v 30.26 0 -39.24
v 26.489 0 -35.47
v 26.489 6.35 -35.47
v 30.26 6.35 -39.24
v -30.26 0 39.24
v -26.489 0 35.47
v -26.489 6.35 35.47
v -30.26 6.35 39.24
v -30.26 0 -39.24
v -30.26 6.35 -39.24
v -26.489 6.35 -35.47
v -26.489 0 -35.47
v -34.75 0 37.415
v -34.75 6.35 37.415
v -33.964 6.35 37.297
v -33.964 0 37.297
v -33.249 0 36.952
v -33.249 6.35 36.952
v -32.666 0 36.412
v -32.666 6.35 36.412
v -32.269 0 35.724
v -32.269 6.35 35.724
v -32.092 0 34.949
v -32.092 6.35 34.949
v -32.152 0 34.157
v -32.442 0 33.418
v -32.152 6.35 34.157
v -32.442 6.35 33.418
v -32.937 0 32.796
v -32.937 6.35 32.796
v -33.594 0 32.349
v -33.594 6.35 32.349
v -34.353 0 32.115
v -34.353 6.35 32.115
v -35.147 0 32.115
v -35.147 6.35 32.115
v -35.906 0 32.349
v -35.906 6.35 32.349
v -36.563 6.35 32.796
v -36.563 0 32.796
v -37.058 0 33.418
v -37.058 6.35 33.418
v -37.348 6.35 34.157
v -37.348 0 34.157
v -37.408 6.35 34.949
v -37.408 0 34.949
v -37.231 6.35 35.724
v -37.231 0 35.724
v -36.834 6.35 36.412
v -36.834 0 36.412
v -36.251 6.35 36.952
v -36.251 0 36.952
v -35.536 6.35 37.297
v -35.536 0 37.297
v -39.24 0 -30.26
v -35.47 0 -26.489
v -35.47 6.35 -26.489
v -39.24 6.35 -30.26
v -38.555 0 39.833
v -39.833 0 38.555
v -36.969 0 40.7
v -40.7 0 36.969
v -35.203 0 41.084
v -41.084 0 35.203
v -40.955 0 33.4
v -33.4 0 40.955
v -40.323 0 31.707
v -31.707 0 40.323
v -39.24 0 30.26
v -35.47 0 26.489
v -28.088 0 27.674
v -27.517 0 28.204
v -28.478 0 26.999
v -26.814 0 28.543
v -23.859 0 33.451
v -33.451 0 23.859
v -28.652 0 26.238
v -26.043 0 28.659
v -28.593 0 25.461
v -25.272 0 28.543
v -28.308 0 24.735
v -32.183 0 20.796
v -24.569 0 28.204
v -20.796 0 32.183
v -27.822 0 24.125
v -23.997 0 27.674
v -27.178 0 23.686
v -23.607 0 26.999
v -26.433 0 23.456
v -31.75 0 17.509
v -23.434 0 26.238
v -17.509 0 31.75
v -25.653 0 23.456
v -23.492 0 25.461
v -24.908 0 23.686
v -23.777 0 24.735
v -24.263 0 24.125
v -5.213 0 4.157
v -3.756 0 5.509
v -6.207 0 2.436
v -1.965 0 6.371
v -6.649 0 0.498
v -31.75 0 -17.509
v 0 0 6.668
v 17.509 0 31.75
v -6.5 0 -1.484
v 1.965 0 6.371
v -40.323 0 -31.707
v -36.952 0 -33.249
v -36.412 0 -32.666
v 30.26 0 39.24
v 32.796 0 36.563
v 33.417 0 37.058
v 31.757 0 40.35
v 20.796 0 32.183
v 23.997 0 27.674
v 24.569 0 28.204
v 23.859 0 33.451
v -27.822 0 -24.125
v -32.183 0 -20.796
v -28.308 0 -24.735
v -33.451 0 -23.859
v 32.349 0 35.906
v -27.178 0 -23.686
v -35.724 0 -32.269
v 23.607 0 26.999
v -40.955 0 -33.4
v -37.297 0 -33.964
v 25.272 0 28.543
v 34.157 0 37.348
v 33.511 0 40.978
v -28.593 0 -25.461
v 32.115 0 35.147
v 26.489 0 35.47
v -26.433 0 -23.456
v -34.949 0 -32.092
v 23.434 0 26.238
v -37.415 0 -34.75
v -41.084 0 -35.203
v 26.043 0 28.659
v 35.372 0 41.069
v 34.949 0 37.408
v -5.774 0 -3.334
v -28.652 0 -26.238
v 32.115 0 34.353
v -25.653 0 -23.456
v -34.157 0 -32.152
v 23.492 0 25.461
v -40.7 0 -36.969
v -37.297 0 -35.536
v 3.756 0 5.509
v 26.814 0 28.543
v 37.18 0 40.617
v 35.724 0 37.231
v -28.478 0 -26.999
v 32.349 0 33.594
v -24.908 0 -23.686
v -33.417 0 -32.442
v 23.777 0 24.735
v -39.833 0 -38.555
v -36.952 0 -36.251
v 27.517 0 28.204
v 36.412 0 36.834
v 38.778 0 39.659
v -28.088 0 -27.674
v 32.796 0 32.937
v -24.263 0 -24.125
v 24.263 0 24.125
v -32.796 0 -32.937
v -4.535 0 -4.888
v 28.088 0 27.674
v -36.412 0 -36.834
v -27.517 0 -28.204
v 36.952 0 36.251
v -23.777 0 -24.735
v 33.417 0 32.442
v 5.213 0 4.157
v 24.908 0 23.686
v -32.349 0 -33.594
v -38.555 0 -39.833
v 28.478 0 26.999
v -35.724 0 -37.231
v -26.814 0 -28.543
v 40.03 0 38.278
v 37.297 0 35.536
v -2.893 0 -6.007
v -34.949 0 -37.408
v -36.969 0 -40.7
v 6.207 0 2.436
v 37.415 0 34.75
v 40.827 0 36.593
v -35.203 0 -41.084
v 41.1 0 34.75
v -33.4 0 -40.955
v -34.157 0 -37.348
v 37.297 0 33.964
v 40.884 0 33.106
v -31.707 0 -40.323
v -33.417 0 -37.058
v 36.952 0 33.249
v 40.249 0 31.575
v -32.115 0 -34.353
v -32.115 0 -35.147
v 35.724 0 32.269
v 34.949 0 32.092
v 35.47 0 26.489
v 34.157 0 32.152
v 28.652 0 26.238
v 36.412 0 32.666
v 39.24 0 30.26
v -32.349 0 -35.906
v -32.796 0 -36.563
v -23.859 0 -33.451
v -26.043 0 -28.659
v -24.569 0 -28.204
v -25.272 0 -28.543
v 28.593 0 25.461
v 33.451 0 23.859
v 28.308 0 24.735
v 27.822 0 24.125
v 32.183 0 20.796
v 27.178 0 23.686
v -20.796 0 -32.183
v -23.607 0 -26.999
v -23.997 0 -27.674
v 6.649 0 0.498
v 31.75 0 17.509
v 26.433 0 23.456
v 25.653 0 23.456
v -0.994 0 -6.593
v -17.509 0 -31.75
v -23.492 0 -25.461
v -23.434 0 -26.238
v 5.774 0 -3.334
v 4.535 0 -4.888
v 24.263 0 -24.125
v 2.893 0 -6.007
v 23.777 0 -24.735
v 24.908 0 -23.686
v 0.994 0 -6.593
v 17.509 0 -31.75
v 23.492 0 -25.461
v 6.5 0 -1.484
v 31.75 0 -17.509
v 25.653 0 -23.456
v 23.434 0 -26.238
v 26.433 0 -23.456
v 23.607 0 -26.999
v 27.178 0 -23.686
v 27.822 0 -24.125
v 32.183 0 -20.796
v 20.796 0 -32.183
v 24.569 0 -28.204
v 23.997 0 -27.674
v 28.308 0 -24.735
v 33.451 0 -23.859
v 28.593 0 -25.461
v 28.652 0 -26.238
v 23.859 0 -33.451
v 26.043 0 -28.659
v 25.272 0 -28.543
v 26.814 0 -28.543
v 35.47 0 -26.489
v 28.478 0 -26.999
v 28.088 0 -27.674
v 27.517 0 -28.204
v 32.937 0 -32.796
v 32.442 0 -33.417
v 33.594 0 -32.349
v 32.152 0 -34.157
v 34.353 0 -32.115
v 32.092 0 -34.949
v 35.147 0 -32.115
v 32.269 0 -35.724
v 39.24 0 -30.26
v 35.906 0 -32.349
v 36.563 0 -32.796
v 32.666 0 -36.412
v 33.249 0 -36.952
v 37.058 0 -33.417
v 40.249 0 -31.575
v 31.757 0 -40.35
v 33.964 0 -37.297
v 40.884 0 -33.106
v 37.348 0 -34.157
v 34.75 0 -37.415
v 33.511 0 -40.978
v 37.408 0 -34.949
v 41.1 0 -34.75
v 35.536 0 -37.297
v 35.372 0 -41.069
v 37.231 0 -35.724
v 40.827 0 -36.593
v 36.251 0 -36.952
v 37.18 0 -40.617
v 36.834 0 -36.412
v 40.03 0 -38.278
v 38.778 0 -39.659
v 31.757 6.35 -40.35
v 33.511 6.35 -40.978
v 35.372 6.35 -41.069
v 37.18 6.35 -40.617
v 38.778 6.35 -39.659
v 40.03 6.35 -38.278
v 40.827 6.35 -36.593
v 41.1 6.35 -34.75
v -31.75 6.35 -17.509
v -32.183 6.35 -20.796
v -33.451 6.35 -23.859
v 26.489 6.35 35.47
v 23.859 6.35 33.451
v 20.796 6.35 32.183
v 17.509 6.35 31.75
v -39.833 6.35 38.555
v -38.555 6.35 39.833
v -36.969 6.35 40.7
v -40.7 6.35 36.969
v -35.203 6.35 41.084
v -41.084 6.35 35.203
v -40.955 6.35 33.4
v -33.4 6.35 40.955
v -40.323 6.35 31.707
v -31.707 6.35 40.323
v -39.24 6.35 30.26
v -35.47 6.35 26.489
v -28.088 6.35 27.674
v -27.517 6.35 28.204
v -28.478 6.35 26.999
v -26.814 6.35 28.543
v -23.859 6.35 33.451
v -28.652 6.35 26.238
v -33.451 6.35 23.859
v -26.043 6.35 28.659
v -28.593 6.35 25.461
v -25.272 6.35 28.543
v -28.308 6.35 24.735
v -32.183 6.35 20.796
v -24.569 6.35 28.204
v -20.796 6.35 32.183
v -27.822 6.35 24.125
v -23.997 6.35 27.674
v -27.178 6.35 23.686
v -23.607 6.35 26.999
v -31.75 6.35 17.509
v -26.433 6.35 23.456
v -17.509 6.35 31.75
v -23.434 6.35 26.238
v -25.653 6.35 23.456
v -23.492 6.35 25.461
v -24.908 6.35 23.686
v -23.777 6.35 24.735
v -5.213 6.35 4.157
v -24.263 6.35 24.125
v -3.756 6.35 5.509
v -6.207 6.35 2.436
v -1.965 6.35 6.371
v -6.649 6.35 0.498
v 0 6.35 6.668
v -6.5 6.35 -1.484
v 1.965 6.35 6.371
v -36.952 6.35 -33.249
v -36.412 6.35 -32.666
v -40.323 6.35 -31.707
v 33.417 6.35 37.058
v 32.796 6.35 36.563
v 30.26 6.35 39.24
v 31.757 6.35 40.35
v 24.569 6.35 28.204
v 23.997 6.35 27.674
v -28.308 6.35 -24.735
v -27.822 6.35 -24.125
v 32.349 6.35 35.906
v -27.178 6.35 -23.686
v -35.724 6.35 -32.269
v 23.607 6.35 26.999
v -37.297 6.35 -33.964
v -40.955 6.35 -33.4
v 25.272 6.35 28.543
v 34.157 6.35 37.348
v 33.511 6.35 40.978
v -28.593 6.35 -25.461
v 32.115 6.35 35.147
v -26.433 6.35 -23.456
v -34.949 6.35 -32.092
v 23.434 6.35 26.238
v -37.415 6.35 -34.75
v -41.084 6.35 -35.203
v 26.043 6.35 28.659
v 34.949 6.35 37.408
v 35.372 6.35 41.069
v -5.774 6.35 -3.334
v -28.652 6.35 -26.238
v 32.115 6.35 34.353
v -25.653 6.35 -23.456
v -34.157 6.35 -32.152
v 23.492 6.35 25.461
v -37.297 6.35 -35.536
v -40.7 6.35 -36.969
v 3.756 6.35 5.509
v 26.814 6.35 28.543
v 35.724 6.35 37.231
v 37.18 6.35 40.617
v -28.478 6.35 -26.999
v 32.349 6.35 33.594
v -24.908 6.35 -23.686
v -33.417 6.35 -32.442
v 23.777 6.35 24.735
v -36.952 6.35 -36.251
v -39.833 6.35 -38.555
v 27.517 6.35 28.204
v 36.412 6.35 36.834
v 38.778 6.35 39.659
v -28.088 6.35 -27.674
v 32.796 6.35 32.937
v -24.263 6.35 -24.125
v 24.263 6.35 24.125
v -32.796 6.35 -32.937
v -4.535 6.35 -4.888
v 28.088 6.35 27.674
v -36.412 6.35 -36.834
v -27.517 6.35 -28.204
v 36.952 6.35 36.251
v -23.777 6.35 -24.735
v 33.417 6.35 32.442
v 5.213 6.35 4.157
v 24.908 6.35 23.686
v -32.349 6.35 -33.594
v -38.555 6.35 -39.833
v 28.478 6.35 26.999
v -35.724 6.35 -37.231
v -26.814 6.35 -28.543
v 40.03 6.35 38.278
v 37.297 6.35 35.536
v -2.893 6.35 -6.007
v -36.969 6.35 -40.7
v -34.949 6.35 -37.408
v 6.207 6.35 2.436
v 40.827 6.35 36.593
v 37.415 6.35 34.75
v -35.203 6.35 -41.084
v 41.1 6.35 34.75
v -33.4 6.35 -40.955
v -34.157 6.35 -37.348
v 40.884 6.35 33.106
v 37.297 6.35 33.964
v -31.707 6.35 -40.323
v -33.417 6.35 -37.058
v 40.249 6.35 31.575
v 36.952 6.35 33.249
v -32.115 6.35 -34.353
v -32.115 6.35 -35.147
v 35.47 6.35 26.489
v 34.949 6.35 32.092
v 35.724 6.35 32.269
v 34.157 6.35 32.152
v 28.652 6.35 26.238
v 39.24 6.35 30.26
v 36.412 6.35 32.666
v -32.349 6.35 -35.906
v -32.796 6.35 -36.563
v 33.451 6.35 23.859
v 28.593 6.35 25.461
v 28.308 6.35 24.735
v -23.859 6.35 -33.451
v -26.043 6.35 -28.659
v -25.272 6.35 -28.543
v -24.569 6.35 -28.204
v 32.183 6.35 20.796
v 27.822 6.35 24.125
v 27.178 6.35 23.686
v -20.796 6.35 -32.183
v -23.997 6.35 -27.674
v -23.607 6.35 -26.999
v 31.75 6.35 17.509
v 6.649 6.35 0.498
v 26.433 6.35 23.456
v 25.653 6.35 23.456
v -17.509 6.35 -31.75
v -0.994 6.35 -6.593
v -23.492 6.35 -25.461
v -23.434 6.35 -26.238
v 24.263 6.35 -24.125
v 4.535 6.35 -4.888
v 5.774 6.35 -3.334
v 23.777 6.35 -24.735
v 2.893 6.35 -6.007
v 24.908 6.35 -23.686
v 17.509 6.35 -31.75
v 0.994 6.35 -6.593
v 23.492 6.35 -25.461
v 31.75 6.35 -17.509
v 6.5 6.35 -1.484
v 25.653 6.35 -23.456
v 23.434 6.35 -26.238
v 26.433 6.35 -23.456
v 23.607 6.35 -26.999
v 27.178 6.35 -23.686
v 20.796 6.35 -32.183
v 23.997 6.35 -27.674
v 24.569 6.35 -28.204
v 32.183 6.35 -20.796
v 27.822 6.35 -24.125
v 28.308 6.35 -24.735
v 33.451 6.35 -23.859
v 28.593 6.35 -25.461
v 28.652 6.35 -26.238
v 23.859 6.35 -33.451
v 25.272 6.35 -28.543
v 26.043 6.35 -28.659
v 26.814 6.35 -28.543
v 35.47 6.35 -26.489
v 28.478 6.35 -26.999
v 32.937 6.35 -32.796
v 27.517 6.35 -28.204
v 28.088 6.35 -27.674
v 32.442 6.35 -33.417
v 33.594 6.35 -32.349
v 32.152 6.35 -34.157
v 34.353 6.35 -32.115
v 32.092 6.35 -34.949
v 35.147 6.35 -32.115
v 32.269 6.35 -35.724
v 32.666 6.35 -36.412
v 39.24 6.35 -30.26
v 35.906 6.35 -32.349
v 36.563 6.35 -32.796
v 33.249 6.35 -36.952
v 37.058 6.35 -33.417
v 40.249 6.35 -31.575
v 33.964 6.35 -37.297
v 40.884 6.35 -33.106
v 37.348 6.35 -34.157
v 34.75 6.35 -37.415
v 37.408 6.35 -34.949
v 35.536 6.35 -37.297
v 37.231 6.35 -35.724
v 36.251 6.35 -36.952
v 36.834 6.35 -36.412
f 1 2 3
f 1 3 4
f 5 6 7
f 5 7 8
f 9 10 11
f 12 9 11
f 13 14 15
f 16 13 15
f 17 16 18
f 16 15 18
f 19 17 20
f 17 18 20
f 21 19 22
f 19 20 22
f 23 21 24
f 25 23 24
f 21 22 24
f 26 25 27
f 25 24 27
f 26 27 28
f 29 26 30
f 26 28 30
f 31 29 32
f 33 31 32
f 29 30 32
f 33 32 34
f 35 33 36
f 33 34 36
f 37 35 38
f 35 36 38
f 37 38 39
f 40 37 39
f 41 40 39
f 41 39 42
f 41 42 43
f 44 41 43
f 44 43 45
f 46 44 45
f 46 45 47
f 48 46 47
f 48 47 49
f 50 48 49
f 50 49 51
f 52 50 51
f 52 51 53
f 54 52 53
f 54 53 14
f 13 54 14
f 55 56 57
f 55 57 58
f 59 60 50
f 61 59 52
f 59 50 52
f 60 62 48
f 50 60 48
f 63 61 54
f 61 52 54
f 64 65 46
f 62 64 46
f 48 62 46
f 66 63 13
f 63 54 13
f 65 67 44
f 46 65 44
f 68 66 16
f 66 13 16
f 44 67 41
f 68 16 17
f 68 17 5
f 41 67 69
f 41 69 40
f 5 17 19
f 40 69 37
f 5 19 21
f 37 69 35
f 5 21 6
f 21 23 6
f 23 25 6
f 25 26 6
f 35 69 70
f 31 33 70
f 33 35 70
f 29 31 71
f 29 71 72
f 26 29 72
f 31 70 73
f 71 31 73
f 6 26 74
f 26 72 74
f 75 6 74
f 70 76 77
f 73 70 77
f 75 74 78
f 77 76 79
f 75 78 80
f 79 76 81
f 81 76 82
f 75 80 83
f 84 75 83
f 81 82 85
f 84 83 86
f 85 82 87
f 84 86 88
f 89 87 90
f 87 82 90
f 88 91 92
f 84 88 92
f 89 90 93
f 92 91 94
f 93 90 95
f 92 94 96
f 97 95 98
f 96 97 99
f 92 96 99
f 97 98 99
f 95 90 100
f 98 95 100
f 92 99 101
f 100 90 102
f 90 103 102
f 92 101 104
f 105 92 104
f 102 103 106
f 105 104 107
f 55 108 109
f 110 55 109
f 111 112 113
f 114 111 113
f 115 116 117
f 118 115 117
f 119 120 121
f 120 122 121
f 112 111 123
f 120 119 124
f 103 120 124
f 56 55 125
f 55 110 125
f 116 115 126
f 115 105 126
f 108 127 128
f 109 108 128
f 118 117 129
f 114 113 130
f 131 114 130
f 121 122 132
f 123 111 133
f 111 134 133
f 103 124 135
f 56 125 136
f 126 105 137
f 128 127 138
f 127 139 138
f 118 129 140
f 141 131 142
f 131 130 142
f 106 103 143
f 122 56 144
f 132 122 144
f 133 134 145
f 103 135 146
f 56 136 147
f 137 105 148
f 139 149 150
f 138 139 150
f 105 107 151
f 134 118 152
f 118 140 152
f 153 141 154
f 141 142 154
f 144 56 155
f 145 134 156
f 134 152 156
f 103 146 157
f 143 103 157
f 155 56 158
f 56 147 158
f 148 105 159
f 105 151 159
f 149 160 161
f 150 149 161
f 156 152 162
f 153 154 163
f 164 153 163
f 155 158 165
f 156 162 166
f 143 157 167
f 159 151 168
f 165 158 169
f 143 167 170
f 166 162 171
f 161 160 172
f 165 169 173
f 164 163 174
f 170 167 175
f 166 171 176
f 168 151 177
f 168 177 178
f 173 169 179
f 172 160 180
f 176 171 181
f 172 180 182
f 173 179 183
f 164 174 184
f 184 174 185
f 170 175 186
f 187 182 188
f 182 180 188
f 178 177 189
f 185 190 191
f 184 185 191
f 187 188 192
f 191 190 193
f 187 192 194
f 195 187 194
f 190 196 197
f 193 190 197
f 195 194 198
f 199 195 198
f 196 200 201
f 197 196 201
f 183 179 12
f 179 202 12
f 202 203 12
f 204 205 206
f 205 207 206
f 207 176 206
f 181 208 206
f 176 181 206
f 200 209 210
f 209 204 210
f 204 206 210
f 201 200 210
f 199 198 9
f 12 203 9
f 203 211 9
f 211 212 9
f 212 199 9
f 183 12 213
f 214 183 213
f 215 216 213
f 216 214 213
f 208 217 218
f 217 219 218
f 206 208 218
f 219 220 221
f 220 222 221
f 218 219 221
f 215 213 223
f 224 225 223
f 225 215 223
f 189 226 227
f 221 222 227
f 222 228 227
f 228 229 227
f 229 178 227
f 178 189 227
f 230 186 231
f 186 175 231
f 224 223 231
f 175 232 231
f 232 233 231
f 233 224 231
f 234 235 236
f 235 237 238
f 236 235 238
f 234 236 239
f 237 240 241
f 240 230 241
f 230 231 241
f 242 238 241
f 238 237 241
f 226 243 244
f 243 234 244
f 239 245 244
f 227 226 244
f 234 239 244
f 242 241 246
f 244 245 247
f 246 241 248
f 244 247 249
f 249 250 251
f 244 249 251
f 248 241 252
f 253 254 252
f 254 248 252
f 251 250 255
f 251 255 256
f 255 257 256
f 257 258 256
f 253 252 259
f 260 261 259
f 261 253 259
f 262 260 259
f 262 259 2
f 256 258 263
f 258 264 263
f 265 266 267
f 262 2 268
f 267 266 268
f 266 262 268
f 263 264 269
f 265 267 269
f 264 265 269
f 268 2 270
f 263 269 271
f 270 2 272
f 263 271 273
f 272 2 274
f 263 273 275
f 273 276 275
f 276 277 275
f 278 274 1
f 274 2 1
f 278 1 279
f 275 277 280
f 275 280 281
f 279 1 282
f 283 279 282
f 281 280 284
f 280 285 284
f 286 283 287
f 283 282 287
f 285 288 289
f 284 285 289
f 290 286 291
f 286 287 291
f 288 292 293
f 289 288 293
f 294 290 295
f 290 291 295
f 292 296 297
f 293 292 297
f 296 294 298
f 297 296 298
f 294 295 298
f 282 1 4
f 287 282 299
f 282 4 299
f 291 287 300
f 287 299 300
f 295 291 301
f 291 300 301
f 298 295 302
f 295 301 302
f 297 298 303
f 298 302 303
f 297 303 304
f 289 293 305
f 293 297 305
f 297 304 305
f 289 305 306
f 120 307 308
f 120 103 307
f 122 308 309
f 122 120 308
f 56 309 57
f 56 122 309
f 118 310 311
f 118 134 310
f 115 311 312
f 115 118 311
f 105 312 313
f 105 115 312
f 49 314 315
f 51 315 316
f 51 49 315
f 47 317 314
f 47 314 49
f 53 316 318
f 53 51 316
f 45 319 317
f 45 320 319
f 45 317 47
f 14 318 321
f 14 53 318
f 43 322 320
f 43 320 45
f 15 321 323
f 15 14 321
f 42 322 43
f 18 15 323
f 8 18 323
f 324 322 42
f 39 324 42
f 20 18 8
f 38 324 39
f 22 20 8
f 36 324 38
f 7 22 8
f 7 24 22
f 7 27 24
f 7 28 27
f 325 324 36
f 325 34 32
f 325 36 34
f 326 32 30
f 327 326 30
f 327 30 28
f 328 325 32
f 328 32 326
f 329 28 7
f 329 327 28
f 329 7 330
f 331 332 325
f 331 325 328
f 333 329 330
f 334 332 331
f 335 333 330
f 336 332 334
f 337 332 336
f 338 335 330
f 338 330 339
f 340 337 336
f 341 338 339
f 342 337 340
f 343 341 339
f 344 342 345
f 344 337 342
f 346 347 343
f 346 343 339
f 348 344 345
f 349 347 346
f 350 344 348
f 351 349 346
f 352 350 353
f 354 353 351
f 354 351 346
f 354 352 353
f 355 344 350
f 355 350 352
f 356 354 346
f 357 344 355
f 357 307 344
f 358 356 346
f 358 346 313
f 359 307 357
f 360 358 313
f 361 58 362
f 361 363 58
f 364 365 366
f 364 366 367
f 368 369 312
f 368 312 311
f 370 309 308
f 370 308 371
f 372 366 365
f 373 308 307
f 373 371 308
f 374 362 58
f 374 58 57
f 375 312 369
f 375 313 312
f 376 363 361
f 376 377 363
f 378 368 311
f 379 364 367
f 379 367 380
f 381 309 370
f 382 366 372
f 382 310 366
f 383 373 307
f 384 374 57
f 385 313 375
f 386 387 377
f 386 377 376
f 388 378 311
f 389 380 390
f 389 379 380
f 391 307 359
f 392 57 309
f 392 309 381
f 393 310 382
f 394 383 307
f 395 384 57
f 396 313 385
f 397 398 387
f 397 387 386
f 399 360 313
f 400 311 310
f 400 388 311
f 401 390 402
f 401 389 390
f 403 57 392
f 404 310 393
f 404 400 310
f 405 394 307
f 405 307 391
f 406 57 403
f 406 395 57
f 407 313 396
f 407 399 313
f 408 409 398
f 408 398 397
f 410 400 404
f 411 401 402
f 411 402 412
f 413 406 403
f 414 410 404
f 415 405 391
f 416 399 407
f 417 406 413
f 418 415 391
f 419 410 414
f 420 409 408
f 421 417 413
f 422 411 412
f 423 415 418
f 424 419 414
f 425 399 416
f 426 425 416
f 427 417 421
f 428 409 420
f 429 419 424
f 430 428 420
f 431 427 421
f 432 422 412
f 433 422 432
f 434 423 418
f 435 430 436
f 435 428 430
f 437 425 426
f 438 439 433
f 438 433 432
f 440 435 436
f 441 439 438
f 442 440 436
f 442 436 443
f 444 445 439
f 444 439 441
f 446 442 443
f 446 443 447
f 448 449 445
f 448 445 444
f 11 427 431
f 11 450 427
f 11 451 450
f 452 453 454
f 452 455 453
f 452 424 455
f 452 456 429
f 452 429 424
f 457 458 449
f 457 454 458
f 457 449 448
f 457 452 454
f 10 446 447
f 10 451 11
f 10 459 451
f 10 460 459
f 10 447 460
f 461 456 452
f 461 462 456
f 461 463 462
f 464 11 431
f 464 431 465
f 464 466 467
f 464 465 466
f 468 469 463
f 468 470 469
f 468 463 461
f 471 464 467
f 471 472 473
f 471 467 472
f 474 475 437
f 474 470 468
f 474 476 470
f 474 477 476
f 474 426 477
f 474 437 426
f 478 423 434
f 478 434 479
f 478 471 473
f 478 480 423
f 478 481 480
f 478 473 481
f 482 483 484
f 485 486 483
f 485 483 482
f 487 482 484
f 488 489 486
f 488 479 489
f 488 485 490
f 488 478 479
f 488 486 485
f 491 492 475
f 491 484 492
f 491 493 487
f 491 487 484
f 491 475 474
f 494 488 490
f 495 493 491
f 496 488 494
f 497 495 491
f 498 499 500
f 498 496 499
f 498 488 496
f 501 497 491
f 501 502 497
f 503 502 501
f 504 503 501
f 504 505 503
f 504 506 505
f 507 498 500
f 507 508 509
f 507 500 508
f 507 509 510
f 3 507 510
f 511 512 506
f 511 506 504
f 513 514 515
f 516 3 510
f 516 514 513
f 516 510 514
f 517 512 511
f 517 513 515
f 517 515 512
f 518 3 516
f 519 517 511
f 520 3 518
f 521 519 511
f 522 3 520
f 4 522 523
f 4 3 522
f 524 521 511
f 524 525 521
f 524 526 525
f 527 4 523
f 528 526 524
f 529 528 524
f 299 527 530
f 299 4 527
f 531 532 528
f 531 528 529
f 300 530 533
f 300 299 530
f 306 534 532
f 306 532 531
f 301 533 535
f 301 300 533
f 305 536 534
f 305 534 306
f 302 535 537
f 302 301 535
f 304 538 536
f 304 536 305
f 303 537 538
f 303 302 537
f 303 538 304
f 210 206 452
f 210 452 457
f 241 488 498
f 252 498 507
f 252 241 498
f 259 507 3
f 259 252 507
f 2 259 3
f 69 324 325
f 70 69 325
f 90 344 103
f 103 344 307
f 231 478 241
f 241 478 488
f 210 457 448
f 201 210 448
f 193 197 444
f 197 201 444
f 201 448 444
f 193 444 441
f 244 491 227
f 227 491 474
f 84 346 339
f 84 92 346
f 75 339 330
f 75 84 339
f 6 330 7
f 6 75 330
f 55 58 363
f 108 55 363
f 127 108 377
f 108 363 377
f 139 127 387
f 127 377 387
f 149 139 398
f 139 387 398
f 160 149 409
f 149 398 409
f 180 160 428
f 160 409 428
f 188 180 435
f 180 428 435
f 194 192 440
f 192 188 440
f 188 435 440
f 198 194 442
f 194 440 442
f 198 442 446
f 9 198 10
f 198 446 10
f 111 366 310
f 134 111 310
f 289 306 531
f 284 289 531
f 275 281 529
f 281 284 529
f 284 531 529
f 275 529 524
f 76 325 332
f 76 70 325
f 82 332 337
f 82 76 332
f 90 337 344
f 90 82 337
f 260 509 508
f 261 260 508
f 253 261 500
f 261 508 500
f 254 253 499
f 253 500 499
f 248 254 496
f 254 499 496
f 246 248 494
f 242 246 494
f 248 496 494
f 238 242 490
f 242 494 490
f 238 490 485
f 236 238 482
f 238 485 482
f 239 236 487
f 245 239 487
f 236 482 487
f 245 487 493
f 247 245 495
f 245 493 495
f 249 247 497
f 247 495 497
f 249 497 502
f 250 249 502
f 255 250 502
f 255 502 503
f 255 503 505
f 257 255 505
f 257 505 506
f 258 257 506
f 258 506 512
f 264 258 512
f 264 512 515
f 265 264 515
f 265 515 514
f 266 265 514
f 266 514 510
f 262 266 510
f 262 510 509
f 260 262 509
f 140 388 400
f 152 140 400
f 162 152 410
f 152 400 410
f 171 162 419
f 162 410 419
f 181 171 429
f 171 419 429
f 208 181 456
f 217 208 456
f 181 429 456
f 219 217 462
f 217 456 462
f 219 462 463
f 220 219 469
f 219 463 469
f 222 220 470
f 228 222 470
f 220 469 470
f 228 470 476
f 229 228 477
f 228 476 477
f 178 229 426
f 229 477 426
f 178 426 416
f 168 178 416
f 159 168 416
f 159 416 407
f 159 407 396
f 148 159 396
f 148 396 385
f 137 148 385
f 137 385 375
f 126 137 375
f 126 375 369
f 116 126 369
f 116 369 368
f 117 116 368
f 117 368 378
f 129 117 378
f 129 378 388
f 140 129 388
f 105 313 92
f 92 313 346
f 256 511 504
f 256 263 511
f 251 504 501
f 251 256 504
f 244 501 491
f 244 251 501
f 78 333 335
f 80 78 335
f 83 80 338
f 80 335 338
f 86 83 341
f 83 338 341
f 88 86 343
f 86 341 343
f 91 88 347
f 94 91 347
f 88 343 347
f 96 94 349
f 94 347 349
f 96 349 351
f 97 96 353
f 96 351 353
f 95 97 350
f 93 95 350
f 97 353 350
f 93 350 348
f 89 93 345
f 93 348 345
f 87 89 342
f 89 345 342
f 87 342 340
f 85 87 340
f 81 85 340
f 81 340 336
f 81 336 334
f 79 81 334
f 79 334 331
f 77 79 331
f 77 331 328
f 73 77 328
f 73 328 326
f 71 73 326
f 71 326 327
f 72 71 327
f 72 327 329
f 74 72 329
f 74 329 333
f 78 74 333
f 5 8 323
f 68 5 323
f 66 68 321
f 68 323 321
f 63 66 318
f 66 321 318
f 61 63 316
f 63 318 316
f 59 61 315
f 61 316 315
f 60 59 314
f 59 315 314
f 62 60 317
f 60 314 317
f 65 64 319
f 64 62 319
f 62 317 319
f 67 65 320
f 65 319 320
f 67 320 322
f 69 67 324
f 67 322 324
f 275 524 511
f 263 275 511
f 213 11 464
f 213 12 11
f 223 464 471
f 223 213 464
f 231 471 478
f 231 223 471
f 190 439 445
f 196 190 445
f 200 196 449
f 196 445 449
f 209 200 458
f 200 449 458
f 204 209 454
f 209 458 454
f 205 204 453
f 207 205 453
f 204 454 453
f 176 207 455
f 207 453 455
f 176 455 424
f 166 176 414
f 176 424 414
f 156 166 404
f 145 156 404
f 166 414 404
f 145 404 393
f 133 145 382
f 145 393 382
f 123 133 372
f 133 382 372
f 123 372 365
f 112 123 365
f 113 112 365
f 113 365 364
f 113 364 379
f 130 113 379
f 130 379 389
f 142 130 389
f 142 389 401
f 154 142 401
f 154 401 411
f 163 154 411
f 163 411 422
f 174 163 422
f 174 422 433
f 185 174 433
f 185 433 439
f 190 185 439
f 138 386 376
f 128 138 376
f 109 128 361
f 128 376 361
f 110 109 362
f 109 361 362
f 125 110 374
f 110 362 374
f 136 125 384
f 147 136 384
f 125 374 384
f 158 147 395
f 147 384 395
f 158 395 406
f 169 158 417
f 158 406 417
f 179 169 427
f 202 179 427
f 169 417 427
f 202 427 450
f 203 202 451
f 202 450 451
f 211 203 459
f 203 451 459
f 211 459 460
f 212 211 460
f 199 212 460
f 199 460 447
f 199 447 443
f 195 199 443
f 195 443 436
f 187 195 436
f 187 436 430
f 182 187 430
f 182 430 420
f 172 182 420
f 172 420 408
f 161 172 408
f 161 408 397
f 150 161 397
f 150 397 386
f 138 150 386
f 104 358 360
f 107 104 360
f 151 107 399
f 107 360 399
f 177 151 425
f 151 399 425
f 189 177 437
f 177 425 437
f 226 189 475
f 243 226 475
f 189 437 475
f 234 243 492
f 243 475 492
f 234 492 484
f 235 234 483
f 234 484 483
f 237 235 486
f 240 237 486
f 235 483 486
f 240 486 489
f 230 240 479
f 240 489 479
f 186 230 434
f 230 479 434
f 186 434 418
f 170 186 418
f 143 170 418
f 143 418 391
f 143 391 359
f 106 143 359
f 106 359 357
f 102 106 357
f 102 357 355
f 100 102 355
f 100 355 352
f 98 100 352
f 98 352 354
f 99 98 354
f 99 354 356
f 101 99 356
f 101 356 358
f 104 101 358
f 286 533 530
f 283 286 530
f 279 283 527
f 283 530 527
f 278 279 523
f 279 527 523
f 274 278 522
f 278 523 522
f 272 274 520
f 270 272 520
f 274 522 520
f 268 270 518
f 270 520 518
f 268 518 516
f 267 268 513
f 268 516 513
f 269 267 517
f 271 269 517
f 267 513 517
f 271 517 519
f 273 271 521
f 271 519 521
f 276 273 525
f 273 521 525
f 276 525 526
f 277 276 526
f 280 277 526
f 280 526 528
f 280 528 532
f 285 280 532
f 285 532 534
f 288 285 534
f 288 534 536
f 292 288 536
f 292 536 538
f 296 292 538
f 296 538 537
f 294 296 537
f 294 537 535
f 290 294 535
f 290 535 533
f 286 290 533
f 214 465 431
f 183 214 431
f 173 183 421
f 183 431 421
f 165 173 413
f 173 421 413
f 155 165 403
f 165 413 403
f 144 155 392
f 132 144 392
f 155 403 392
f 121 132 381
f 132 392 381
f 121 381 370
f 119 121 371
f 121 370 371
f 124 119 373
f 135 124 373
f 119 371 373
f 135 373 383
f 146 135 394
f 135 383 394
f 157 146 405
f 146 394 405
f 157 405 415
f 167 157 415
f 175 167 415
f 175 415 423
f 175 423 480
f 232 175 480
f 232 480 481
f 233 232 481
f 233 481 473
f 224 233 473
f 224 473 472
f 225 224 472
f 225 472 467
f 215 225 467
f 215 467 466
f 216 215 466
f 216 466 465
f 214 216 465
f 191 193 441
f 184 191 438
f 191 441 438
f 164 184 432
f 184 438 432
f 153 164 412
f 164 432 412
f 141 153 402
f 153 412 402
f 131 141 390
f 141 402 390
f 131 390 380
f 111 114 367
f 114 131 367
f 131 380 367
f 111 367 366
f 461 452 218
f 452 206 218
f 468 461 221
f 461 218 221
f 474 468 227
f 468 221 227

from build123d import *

# Parameters (mm, degrees)
SKETCH1_W           = 85.2
SKETCH1_H           = 85.2
BOSS_EXTRUDE1_DEPTH = 6.35
CUT_EXTRUDE1_REACH  = 62.579
SKETCH2_R           = 6.6675
CUT_EXTRUDE2_REACH  = 62.579
SKETCH3_R           = 2.6162
CUT_EXTRUDE3_REACH  = 62.579
SKETCH5_R           = 2.665
CIRPATTERN1_COUNT   = 4
CUT_EXTRUDE4_REACH  = 62.579
SKETCH6_W           = 85.2
SKETCH6_H           = 85.2
FILLET1_R           = 12.7


with BuildPart() as part:
    # Sketch1 → Boss-Extrude1 (new body)
    with BuildSketch(Plane(origin=(0, 0, 0), x_dir=(1, 0, 0), z_dir=(0, 1, 0))):
        Rectangle(SKETCH1_W, SKETCH1_H)
    extrude(amount=BOSS_EXTRUDE1_DEPTH)

    # Sketch2 → Cut-Extrude1 (cut, up to next)
    with BuildSketch(Plane(origin=(0, 6.35, 0), x_dir=(1, 0, 0), z_dir=(0, 1, 0)), mode=Mode.PRIVATE) as cut_extrude1_sk1:
        with Locations(Location((0, 0, 0), (0, 0, 270))):
            Circle(SKETCH2_R)
    cut_extrude1_tool1 = extrude(cut_extrude1_sk1.sketch, amount=-CUT_EXTRUDE1_REACH, mode=Mode.PRIVATE) & part.part
    add(cut_extrude1_tool1.solids().sort_by_distance((0, 6.35, 0))[0], mode=Mode.SUBTRACT)

    # Sketch3 → Cut-Extrude2 (cut, up to next)
    with BuildSketch(Plane(origin=(0, 6.35, 0), x_dir=(1, 0, 0), z_dir=(0, 1, 0)), mode=Mode.PRIVATE) as cut_extrude2_sk1:
        with Locations(Location((26.042742751, -26.042742751, 0), (0, 0, 270))):
            Circle(SKETCH3_R)
    cut_extrude2_tool1 = extrude(cut_extrude2_sk1.sketch, amount=-CUT_EXTRUDE2_REACH, mode=Mode.PRIVATE) & part.part
    # Sketch3 → Cut-Extrude2 (cut, up to next)
    with BuildSketch(Plane(origin=(0, 6.35, 0), x_dir=(1, 0, 0), z_dir=(0, 1, 0)), mode=Mode.PRIVATE) as cut_extrude2_sk2:
        with Locations(Location((-26.042742751, -26.042742751, 0), (0, 0, 270))):
            Circle(SKETCH3_R)
    cut_extrude2_tool2 = extrude(cut_extrude2_sk2.sketch, amount=-CUT_EXTRUDE2_REACH, mode=Mode.PRIVATE) & part.part
    # Sketch3 → Cut-Extrude2 (cut, up to next)
    with BuildSketch(Plane(origin=(0, 6.35, 0), x_dir=(1, 0, 0), z_dir=(0, 1, 0)), mode=Mode.PRIVATE) as cut_extrude2_sk3:
        with Locations(Location((26.042742751, 26.042742751, 0), (0, 0, 90))):
            Circle(SKETCH3_R)
    cut_extrude2_tool3 = extrude(cut_extrude2_sk3.sketch, amount=-CUT_EXTRUDE2_REACH, mode=Mode.PRIVATE) & part.part
    # Sketch3 → Cut-Extrude2 (cut, up to next)
    with BuildSketch(Plane(origin=(0, 6.35, 0), x_dir=(1, 0, 0), z_dir=(0, 1, 0)), mode=Mode.PRIVATE) as cut_extrude2_sk4:
        with Locations(Location((-26.042742751, 26.042742751, 0), (0, 0, 90))):
            Circle(SKETCH3_R)
    cut_extrude2_tool4 = extrude(cut_extrude2_sk4.sketch, amount=-CUT_EXTRUDE2_REACH, mode=Mode.PRIVATE) & part.part
    add(cut_extrude2_tool1.solids().sort_by_distance((26.042743, 6.35, 26.042743))[0], mode=Mode.SUBTRACT)
    add(cut_extrude2_tool2.solids().sort_by_distance((-26.042743, 6.35, 26.042743))[0], mode=Mode.SUBTRACT)
    add(cut_extrude2_tool3.solids().sort_by_distance((26.042743, 6.35, -26.042743))[0], mode=Mode.SUBTRACT)
    add(cut_extrude2_tool4.solids().sort_by_distance((-26.042743, 6.35, -26.042743))[0], mode=Mode.SUBTRACT)

    # Sketch5 → Cut-Extrude3 (cut, up to next)
    with BuildSketch(Plane(origin=(0, 6.35, 0), x_dir=(1, 0, 0), z_dir=(0, 1, 0)), mode=Mode.PRIVATE) as cut_extrude3_sk1:
        with Locations(Location((-34.75, -34.75, 0), (0, 0, 270))):
            Circle(SKETCH5_R)
    cut_extrude3_tool1 = extrude(cut_extrude3_sk1.sketch, amount=-CUT_EXTRUDE3_REACH, mode=Mode.PRIVATE) & part.part
    cut_extrude3 = cut_extrude3_tool1.solids().sort_by_distance((-34.75, 6.35, 34.75))[0]
    add(cut_extrude3, mode=Mode.SUBTRACT)

    # CirPattern1: Cut-Extrude3 ×4 about axis
    cirpattern1_axis = Axis((0, 0, 0), (0, 1, 0))
    for i in range(1, CIRPATTERN1_COUNT):
        add(cut_extrude3.rotate(cirpattern1_axis, i * 360 / CIRPATTERN1_COUNT), mode=Mode.SUBTRACT)

    # Sketch6 → Cut-Extrude4 (cut, up to next)
    with BuildSketch(Plane(origin=(0, 6.35, 0), x_dir=(1, 0, 0), z_dir=(0, 1, 0)), mode=Mode.PRIVATE) as cut_extrude4_sk1:
        Rectangle(SKETCH6_W, SKETCH6_H)
        with BuildLine():
            Line((31.75, -22.769743879), (39.240128061, -30.259871939))
            ThreePointArc((39.240128061, -30.259871939), (40.616635031, -32.319960204), (41.1, -34.75))
            ThreePointArc((41.1, -34.75), (37.180039796, -40.616635031), (30.259871939, -39.240128061))
            Line((30.259871939, -39.240128061), (22.769743879, -31.75))
            Line((22.769743879, -31.75), (-22.769743879, -31.75))
            Line((-22.769743879, -31.75), (-30.259871939, -39.240128061))
            ThreePointArc((-30.259871939, -39.240128061), (-39.240128061, -39.240128061), (-39.240128061, -30.259871939))
            Line((-39.240128061, -30.259871939), (-31.75, -22.769743879))
            Line((-31.75, -22.769743879), (-31.75, 22.769743879))
            Line((-31.75, 22.769743879), (-39.240128061, 30.259871939))
            ThreePointArc((-39.240128061, 30.259871939), (-39.240128061, 39.240128061), (-30.259871939, 39.240128061))
            Line((-30.259871939, 39.240128061), (-22.769743879, 31.75))
            Line((-22.769743879, 31.75), (22.769743879, 31.75))
            Line((22.769743879, 31.75), (30.259871939, 39.240128061))
            ThreePointArc((30.259871939, 39.240128061), (37.180039796, 40.616635031), (41.1, 34.75))
            ThreePointArc((41.1, 34.75), (40.616635031, 32.319960204), (39.240128061, 30.259871939))
            Line((39.240128061, 30.259871939), (31.75, 22.769743879))
            Line((31.75, 22.769743879), (31.75, -22.769743879))
        make_face(mode=Mode.SUBTRACT)
    cut_extrude4_tool1 = extrude(cut_extrude4_sk1.sketch, amount=-CUT_EXTRUDE4_REACH, mode=Mode.PRIVATE) & part.part
    add(cut_extrude4_tool1.solids().sort_by_distance((0, 6.35, 41.39509))[0], mode=Mode.SUBTRACT)

    # Fillet1
    fillet1_edges = [part.edges().sort_by_distance(p)[0] for p in [
        (22.769743879, 3.175, -31.75),
        (-22.769743879, 3.175, -31.75),
        (-31.75, 3.175, -22.769743879),
        (-31.75, 3.175, 22.769743879),
        (-22.769743879, 3.175, 31.75),
        (22.769743879, 3.175, 31.75),
        (31.75, 3.175, 22.769743879),
        (31.75, 3.175, -22.769743879),
    ]]
    fillet(fillet1_edges, radius=FILLET1_R)


solid = part.part
